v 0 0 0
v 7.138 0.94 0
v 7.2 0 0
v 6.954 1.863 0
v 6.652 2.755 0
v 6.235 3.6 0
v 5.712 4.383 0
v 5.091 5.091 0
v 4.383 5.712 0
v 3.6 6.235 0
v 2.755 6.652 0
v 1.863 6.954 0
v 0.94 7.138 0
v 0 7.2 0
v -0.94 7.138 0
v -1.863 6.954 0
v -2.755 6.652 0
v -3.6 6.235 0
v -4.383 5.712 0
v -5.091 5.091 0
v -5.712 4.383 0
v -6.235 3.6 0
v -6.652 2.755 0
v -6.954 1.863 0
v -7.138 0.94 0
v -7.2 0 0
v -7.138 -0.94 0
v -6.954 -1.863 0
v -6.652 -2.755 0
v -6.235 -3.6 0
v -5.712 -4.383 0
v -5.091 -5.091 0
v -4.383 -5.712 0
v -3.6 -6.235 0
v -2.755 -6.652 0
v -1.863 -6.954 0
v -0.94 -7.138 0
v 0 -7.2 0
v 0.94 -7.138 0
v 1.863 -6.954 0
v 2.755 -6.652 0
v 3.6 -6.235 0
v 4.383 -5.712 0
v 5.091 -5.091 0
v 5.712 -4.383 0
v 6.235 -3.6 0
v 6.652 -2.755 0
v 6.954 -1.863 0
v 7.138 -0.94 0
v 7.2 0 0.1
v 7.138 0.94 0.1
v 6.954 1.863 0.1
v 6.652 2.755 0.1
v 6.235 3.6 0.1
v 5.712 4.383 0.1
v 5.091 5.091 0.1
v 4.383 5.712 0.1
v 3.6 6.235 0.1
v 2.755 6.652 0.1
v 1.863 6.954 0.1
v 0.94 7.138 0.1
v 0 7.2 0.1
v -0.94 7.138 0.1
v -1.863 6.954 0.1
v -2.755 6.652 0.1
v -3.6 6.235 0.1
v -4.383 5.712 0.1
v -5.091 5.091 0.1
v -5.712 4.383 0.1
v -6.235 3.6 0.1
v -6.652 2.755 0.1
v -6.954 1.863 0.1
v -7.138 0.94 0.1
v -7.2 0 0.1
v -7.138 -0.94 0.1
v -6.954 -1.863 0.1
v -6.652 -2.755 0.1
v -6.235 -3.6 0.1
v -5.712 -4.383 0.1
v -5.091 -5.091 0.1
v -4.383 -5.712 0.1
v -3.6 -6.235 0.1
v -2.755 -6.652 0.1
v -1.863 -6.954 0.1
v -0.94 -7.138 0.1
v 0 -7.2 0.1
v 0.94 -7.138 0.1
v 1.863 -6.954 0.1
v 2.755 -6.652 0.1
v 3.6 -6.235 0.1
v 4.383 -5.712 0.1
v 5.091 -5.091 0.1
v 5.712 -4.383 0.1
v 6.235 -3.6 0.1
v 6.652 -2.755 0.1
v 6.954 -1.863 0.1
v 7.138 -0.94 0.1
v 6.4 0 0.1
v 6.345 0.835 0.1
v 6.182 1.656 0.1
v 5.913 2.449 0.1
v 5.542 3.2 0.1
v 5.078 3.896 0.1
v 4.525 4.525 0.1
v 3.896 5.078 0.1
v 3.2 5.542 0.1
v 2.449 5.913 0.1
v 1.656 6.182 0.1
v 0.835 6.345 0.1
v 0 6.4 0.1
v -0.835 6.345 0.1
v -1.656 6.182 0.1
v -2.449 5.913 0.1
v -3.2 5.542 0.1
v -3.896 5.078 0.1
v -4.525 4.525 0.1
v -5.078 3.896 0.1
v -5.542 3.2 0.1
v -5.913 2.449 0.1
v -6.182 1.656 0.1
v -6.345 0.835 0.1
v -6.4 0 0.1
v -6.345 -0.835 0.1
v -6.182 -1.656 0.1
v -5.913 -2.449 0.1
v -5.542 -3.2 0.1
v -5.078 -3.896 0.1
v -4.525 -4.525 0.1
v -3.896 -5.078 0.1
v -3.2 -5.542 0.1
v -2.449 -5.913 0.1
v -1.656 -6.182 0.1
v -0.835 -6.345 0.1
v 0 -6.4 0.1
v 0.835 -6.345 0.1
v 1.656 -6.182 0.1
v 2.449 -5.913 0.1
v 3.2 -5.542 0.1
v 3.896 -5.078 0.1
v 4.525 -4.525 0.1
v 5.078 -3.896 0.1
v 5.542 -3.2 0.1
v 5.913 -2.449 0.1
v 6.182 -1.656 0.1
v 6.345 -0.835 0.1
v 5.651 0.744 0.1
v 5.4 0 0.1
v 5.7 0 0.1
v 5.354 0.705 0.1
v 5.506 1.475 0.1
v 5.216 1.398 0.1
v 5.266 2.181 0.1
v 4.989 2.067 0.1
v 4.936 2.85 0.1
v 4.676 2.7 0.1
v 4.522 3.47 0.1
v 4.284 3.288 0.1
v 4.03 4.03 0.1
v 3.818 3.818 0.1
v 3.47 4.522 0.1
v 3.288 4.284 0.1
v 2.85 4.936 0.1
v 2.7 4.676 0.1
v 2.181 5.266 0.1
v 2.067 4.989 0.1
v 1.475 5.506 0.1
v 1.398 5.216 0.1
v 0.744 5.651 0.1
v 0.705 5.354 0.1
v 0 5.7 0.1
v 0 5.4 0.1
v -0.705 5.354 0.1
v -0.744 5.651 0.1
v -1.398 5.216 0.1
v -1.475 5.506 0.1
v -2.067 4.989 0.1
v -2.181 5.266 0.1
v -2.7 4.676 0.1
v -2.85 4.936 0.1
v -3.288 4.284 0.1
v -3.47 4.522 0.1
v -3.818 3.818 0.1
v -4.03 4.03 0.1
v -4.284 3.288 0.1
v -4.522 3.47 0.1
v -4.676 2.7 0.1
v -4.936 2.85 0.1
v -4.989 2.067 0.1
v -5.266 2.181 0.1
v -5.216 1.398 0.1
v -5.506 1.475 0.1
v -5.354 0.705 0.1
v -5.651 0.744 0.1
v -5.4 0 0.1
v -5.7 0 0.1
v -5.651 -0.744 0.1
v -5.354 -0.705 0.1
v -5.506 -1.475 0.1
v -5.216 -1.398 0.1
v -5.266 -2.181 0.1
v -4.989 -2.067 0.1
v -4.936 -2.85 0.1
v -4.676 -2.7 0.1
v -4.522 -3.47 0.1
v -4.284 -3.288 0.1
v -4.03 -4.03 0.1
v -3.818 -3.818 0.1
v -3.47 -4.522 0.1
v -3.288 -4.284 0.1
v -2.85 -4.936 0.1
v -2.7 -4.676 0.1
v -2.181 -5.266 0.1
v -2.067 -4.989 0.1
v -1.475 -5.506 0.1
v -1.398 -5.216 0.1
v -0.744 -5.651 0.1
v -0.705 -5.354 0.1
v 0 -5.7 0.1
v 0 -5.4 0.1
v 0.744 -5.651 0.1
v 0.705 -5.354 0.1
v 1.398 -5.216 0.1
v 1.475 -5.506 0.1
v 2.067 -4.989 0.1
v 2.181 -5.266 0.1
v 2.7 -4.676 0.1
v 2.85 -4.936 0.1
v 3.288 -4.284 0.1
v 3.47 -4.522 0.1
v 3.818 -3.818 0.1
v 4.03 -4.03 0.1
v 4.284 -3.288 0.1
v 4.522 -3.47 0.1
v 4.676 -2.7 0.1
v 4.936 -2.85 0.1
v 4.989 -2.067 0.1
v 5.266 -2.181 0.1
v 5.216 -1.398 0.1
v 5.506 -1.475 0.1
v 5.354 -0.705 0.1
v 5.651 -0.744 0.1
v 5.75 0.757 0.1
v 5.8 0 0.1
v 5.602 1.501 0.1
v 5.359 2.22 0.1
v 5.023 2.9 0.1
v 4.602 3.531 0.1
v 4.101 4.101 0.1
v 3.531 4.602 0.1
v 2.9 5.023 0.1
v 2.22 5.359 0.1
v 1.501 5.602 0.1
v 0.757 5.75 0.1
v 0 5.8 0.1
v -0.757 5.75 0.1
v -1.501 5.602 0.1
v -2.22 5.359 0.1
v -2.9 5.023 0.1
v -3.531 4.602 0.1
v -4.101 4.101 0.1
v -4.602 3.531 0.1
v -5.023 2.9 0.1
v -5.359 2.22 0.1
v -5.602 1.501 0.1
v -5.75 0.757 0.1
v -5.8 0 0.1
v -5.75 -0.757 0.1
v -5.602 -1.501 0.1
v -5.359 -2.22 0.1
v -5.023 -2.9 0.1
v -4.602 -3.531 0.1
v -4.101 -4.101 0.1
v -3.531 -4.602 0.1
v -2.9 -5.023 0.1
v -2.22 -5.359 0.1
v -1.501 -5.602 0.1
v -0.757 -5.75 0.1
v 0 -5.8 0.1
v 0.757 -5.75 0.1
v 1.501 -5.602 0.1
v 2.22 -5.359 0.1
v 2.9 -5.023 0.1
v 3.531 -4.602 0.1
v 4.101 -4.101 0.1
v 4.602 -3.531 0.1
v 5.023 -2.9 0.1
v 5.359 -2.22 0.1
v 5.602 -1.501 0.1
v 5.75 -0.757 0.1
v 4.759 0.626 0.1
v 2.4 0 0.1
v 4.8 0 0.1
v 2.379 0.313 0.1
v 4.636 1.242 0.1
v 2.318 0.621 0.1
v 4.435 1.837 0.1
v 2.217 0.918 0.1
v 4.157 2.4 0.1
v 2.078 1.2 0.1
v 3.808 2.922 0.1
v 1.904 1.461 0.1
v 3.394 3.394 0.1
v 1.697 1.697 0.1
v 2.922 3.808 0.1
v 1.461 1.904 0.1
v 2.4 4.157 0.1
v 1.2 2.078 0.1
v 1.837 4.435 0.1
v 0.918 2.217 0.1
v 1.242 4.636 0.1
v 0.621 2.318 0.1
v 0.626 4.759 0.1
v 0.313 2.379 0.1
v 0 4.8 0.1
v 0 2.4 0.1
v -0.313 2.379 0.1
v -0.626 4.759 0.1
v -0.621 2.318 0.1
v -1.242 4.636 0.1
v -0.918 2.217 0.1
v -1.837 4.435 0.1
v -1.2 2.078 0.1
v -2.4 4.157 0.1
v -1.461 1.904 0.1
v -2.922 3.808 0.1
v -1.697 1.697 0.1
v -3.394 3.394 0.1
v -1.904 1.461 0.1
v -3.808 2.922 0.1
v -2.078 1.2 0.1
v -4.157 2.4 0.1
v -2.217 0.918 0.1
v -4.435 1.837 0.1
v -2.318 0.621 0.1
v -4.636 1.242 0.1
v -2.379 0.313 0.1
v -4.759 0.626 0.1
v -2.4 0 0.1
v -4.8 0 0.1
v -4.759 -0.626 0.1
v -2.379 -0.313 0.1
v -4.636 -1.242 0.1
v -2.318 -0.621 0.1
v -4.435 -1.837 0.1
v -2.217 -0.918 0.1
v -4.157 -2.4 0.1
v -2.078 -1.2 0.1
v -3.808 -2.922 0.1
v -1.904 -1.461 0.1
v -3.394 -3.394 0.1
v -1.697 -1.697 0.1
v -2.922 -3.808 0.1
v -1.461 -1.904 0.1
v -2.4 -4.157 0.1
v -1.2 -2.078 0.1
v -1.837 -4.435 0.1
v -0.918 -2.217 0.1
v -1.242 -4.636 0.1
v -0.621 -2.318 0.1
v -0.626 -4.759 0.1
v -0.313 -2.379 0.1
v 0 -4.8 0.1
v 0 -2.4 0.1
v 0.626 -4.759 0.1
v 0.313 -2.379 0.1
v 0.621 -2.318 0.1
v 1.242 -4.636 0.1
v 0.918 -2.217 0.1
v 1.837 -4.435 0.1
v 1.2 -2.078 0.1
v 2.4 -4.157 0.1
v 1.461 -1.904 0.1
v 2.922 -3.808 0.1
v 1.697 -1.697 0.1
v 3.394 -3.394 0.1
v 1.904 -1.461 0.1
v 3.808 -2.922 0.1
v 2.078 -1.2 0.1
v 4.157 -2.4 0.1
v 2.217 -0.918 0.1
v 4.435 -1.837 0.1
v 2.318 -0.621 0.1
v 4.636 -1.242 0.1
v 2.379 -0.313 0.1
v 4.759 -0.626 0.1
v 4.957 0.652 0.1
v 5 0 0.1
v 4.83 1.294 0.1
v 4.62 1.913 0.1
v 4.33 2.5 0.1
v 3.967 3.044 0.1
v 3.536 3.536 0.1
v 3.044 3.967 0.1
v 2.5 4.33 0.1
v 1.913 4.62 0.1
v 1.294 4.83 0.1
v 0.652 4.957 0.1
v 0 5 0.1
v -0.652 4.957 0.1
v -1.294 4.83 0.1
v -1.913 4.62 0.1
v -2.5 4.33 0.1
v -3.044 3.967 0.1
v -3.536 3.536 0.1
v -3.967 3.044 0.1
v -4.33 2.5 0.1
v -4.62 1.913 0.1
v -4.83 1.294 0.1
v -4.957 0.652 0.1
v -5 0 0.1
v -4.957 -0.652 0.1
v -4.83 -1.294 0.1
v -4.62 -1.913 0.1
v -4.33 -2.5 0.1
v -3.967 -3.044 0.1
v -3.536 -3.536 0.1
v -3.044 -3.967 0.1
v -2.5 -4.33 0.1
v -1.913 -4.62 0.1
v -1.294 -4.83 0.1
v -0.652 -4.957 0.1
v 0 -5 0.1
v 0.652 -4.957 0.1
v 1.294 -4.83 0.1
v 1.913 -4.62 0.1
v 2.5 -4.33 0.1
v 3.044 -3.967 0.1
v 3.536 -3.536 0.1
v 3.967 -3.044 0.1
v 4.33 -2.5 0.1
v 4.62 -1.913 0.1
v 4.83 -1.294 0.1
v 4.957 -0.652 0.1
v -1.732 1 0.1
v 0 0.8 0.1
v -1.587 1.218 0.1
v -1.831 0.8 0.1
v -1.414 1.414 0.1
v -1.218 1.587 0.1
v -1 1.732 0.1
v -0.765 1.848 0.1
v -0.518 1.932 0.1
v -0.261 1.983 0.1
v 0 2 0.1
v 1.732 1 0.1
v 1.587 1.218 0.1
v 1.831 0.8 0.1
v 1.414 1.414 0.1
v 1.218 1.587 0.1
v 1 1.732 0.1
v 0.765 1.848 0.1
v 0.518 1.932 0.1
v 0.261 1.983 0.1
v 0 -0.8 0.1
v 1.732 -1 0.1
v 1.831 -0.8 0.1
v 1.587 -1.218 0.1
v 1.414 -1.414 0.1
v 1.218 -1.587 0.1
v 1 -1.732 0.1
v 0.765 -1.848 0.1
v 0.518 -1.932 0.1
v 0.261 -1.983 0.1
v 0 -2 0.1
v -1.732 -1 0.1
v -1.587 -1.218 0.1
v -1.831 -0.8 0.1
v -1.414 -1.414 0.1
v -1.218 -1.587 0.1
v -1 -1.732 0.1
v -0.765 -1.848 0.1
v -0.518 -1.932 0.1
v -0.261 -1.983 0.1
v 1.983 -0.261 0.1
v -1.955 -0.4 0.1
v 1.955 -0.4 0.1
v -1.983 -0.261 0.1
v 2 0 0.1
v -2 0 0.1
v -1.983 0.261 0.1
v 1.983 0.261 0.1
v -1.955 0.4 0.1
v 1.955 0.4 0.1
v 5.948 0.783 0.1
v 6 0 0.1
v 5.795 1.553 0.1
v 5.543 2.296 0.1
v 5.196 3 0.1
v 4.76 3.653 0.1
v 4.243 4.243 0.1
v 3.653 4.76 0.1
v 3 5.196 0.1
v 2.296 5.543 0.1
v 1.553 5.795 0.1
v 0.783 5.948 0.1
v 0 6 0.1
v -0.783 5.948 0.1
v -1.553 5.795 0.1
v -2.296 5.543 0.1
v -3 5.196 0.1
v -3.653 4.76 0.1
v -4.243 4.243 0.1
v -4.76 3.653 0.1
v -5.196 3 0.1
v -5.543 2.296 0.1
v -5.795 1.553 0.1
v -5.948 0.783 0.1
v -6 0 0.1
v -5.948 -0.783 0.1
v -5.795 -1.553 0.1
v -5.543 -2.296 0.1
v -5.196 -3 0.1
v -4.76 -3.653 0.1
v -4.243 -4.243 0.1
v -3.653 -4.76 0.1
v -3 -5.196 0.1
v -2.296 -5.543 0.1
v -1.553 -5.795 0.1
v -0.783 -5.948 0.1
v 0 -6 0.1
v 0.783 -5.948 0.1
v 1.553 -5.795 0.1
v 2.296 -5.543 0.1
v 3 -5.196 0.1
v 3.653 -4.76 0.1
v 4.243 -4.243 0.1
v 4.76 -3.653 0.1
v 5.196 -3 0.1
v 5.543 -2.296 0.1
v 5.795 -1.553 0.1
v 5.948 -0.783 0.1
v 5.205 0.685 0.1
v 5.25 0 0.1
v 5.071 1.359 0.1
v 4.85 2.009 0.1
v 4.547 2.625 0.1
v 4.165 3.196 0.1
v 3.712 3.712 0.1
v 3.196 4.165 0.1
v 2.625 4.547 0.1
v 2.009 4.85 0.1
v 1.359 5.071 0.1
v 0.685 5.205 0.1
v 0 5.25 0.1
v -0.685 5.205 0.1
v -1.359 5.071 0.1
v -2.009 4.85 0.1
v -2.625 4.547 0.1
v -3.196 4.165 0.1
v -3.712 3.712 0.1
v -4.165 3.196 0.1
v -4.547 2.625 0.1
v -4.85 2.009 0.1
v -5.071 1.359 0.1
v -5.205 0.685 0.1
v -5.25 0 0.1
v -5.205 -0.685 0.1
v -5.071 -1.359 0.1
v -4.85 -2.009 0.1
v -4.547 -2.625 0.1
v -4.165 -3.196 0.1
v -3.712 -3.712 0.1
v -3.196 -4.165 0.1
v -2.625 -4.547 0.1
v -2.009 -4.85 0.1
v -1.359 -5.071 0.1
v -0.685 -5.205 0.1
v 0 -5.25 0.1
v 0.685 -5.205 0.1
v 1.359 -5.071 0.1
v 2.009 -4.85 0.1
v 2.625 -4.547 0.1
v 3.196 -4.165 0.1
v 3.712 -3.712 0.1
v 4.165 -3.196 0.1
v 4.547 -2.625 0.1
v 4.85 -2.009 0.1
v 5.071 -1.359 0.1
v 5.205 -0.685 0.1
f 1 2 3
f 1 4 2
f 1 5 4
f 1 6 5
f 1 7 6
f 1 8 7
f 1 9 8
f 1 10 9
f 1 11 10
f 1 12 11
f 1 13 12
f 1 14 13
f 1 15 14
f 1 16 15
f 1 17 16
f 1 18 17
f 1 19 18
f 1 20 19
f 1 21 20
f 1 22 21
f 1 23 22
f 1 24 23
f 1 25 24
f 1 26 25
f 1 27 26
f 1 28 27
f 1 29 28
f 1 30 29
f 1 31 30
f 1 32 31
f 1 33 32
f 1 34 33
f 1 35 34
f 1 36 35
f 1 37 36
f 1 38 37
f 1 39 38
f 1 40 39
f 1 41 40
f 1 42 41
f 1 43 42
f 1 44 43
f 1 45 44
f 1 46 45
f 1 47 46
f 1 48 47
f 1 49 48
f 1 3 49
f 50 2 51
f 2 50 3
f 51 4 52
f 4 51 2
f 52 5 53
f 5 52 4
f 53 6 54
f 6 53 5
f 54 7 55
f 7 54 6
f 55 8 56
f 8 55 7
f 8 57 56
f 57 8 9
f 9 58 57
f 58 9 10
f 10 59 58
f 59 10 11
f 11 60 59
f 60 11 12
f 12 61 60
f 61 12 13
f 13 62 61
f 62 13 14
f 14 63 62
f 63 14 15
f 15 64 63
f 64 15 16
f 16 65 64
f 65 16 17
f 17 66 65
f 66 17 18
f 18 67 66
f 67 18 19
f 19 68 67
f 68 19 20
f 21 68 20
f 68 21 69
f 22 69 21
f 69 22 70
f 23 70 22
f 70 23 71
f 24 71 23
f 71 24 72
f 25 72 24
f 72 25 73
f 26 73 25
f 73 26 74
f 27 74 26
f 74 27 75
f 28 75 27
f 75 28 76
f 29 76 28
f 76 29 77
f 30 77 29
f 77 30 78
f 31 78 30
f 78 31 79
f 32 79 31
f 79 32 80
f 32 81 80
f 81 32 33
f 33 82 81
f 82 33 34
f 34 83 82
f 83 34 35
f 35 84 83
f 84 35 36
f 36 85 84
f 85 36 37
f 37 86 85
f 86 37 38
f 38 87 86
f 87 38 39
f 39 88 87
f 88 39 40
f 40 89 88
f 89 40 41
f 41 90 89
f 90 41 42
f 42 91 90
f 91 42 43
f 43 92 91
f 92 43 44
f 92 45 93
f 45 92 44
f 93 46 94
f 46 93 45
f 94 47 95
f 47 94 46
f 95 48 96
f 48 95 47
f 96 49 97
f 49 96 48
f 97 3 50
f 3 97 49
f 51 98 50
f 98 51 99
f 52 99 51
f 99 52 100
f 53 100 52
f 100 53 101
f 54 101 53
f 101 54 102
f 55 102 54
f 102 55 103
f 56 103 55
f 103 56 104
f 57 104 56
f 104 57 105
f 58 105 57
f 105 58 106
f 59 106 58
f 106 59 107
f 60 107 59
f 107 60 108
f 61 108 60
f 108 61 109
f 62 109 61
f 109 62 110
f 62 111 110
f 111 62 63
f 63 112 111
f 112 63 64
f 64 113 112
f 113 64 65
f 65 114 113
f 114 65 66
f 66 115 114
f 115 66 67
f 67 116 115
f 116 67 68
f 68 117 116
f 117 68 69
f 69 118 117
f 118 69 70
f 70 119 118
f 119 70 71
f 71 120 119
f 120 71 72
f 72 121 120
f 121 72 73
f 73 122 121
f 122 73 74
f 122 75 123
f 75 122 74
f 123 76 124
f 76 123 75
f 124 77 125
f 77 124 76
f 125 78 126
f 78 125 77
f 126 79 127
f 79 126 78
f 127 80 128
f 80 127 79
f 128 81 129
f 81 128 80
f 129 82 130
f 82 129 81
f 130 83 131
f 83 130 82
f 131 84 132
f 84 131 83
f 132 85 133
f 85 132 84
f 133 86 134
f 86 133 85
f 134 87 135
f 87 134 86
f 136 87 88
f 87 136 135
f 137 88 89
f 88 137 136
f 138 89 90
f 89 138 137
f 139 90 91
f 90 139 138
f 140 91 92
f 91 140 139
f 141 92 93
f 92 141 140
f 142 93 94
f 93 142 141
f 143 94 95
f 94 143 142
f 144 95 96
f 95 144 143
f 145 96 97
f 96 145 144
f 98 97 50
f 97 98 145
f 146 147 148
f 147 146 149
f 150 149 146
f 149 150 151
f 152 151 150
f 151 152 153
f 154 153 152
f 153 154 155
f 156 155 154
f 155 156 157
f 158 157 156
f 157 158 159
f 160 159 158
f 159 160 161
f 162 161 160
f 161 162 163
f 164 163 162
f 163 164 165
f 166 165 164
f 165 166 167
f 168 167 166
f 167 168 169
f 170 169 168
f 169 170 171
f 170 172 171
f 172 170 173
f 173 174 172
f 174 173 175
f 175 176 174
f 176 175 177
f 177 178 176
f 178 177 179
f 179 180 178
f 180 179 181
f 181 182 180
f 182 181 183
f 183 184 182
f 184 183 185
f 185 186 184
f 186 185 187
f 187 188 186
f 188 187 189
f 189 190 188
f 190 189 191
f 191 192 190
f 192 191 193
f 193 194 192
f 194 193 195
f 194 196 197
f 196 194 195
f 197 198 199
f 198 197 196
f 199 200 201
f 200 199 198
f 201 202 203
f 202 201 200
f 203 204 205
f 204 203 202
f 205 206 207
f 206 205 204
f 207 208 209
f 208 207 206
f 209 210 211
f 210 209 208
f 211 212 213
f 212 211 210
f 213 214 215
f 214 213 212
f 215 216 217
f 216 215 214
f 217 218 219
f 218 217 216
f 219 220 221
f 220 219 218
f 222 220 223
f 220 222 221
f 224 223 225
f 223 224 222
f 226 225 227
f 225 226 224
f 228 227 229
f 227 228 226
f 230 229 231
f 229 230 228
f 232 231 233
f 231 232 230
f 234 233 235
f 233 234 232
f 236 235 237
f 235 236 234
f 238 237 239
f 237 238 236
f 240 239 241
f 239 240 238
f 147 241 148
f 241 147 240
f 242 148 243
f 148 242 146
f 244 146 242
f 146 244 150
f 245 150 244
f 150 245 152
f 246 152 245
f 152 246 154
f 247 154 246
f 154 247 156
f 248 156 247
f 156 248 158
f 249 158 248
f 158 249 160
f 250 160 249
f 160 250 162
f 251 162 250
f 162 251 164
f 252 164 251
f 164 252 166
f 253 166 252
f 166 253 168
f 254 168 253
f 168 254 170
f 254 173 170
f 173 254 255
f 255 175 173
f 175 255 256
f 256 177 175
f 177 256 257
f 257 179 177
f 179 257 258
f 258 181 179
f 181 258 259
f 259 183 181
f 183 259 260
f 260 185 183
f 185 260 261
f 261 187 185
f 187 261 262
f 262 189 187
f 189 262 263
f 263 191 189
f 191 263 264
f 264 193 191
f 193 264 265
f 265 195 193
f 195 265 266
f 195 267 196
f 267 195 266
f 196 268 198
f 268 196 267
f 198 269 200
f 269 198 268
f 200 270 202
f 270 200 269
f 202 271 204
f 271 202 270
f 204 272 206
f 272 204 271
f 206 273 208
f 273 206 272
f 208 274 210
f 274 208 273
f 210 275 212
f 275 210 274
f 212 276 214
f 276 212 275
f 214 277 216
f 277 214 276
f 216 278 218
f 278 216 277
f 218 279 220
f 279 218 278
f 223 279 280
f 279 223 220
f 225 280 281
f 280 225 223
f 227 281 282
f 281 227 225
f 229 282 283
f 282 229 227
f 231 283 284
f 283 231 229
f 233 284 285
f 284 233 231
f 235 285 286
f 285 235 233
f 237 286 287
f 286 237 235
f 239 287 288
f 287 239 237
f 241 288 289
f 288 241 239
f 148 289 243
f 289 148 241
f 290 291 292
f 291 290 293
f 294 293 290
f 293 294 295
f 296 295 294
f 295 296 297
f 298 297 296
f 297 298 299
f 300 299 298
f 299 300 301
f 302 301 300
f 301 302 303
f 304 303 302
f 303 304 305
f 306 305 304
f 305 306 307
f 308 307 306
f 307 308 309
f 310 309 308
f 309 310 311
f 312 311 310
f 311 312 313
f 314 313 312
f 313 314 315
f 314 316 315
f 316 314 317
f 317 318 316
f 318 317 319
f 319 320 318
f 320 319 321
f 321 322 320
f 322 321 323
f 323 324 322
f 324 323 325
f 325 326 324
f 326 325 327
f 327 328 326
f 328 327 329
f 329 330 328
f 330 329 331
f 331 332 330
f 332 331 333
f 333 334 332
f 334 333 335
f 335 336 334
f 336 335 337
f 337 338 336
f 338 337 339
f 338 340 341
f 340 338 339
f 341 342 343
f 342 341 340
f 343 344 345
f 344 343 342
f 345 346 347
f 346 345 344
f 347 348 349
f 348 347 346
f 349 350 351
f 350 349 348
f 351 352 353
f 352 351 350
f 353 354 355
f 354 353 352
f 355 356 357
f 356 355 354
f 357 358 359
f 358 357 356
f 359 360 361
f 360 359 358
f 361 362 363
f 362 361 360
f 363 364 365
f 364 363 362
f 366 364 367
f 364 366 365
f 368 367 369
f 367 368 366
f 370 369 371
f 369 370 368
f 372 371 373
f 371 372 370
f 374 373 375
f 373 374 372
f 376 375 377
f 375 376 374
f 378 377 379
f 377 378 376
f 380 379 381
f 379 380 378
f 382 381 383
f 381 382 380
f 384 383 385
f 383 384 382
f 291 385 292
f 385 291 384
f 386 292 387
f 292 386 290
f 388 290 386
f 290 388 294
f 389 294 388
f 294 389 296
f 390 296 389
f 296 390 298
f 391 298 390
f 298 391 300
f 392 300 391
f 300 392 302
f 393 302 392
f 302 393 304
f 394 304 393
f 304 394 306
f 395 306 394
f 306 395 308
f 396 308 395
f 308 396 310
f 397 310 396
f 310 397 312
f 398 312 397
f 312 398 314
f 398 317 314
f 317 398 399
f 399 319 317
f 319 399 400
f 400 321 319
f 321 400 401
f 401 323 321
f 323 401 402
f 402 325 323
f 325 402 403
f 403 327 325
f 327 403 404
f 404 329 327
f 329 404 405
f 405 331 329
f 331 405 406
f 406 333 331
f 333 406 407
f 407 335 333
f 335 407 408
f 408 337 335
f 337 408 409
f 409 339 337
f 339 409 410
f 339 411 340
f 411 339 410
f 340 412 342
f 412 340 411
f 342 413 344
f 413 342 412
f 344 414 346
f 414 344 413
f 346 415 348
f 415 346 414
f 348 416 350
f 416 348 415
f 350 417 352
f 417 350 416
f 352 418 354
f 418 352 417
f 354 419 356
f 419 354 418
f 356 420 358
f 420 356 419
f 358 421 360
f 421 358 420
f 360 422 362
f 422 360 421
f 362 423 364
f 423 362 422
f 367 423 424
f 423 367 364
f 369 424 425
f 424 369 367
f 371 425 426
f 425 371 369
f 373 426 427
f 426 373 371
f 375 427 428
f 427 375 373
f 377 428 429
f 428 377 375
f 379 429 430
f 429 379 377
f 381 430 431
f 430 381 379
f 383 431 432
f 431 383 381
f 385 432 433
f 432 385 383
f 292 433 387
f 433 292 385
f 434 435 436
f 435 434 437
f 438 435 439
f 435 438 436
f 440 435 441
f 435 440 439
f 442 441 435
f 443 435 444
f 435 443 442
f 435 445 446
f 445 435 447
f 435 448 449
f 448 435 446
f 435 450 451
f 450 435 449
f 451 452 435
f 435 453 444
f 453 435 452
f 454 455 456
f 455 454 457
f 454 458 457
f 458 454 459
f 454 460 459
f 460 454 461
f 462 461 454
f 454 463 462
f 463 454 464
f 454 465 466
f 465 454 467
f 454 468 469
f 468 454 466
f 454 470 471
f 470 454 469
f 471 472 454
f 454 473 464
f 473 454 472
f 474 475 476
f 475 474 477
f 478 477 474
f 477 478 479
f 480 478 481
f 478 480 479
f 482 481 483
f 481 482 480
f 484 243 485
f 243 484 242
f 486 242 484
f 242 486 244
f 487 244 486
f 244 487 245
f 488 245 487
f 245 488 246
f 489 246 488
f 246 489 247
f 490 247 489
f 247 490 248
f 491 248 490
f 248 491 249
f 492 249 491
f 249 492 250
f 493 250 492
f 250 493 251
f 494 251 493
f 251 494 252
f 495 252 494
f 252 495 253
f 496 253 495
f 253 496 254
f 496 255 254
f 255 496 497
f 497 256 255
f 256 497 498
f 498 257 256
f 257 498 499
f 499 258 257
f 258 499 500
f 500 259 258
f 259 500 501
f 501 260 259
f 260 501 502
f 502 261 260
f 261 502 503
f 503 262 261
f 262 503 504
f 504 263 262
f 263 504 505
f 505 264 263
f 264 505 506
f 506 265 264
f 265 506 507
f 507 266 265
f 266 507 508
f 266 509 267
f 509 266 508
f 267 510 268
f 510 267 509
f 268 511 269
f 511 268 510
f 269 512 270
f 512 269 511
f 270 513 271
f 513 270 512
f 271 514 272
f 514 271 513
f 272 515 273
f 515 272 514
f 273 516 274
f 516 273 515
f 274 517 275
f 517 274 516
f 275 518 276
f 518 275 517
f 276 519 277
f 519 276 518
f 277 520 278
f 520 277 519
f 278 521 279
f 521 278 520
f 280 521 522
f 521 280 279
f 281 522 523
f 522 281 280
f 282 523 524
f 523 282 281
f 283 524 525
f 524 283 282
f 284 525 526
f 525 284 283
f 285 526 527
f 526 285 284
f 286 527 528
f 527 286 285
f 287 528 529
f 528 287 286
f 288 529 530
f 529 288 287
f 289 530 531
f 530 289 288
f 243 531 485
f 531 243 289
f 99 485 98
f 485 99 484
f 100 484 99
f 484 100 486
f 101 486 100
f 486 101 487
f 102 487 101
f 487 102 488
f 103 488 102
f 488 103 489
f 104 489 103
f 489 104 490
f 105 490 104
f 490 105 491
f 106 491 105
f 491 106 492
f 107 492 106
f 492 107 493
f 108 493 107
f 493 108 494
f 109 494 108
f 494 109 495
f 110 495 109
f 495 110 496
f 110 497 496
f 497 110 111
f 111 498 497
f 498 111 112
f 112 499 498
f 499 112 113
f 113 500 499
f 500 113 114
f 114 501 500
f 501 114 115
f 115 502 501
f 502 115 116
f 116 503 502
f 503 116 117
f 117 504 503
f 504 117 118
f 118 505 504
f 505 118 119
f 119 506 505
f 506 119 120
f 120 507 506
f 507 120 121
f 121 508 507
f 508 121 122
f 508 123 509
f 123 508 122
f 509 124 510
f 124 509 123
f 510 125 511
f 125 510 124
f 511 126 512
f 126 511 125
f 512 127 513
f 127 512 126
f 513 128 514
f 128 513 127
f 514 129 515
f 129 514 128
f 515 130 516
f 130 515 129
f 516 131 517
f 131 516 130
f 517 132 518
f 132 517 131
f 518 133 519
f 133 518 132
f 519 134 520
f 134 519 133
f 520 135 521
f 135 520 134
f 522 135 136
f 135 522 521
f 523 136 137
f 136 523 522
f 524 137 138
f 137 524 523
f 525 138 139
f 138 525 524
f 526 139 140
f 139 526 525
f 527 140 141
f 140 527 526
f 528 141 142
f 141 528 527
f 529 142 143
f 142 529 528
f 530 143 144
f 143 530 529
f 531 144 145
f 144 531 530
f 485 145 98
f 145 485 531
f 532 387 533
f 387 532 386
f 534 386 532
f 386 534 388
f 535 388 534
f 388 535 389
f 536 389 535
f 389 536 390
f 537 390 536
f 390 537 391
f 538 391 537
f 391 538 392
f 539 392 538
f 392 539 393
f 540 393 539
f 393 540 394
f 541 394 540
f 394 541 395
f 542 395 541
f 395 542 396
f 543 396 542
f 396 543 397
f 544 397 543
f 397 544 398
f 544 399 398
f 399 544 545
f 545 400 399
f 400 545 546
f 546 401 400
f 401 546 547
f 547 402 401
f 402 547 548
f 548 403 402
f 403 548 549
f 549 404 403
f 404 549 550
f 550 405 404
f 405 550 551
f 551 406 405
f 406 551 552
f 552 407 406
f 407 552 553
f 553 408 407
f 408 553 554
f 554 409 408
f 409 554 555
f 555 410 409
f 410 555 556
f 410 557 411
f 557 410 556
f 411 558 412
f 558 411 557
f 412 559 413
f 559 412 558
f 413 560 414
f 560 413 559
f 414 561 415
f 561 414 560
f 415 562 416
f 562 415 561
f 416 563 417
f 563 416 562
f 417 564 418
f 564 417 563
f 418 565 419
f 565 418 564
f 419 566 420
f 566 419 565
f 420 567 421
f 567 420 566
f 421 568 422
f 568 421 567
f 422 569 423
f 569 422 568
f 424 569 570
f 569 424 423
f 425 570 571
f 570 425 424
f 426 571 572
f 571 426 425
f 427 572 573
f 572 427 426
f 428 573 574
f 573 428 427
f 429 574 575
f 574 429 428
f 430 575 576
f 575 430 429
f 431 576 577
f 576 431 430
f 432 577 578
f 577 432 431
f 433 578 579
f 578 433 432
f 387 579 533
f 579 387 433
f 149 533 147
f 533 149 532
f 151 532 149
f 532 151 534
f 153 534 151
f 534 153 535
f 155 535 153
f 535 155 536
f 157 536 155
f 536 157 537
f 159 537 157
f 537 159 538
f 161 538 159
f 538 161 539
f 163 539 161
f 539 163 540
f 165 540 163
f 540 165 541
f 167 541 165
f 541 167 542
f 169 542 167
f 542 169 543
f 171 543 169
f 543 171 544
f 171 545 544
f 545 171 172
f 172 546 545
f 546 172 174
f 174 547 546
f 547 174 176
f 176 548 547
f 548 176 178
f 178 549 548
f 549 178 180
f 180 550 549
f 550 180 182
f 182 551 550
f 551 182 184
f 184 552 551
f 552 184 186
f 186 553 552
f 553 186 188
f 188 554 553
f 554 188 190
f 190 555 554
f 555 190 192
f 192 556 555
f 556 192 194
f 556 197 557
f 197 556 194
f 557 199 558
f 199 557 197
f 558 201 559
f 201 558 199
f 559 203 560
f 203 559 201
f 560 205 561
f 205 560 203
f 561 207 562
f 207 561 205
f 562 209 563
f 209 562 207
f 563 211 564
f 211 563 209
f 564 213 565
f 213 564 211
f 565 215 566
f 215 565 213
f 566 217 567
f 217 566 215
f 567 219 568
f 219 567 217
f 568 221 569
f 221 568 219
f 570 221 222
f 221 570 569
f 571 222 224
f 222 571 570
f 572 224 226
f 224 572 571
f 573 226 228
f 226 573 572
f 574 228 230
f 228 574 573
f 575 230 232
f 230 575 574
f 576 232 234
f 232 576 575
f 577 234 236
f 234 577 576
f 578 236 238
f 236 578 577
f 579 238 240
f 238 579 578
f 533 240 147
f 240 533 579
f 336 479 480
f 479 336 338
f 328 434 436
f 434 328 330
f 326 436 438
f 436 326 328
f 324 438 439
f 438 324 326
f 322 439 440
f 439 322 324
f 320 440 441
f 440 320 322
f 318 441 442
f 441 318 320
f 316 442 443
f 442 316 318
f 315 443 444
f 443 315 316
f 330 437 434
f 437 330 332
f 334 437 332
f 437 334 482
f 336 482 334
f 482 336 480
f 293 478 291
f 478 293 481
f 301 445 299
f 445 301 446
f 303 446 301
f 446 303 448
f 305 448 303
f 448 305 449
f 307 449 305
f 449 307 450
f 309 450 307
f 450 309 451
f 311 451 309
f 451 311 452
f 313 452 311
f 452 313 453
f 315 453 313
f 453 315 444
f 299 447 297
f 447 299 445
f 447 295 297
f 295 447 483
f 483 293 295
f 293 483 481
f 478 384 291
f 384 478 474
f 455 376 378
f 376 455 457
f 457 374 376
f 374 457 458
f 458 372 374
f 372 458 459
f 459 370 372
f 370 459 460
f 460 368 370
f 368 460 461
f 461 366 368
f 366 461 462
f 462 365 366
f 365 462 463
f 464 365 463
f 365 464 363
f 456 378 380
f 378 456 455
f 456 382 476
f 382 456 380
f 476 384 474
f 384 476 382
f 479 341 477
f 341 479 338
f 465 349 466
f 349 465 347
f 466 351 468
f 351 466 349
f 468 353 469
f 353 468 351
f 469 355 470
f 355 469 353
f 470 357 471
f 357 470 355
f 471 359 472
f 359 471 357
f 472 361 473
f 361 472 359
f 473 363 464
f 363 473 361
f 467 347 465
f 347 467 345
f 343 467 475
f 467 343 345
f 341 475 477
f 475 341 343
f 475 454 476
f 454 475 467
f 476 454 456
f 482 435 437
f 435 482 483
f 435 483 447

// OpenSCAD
use <../lib.scad>
use <../p/48/4-4cylc3.scad>
use <../p/48/4-4ring1.scad>
use <../p/48/4-4ring15.scad>
use <../p/48/4-4ring18.scad>
use <../p/48/4-4ring20.scad>
use <../p/48/4-4ring24.scad>
use <../p/48/4-4ring29.scad>
use <../p/48/4-4ring35.scad>
use <../p/48/4-4ring57.scad>
use <../p/48/4-4ring8.scad>
function ldraw_lib__6347356k() = [
// 0 Sticker  1.8 x  1.8 Round with Black Rings
// 0 Name: 6347356k.dat
// 0 Author: Evert-Jan Boer [ejboer]
// 0 !LDRAW_ORG Part UPDATE 2025-04
// 0 !LICENSE Licensed under CC BY 4.0 : see CAreadme.txt
// 
// 0 BFC CERTIFY CCW
  [0,"BFC","CERTIFY"],
  [0,"BFC","CCW"],
// 
// 0 !KEYWORDS Republic Gunship, Set 75309, Star Wars
// 
// 0 !HISTORY 2024-03-23 [OrionP] Updated ring primitives
// 0 !HISTORY 2025-04-27 [OrionP] Official Update 2025-04
// 
// 1 16 0 0 0 18 0 0 0 -0.25 0 0 0 18 48\4-4cylc3.dat
  [1,16,0,0,0,18,0,0,0,-0.25,0,0,0,18, ldraw_lib__48__4_4cylc3()],
// 1 16 0 -.25 0 2 0 0 0 1 0 0 0 2 48\4-4ring8.dat
  [1,16,0,-.25,0,2,0,0,0,1,0,0,0,2, ldraw_lib__48__4_4ring8()],
// 1 16 0 -.25 0 .75 0 0 0 1 0 0 0 .75 48\4-4ring18.dat
  [1,16,0,-.25,0,.75,0,0,0,1,0,0,0,.75, ldraw_lib__48__4_4ring18()],
// 1 16 0 -.25 0 .25 0 0 0 1 0 0 0 .25 48\4-4ring57.dat
  [1,16,0,-.25,0,.25,0,0,0,1,0,0,0,.25, ldraw_lib__48__4_4ring57()],
// 1 16 0 -.25 0 6 0 0 0 1 0 0 0 6 48\4-4ring1.dat
  [1,16,0,-.25,0,6,0,0,0,1,0,0,0,6, ldraw_lib__48__4_4ring1()],
// 1 16 0 -.25 0 .5 0 0 0 1 0 0 0 .5 48\4-4ring24.dat
  [1,16,0,-.25,0,.5,0,0,0,1,0,0,0,.5, ldraw_lib__48__4_4ring24()],
// 4 16 -4.5768 -.25 2 0 -.25 2 -3.967 -.25 3.044 -4.33 -.25 2.5
  [4,16,-4.5768,-.25,2,0,-.25,2,-3.967,-.25,3.044,-4.33,-.25,2.5],
// 4 16 -3.967 -.25 3.044 0 -.25 2 -3.044 -.25 3.967 -3.5355 -.25 3.5355
  [4,16,-3.967,-.25,3.044,0,-.25,2,-3.044,-.25,3.967,-3.5355,-.25,3.5355],
// 4 16 -3.044 -.25 3.967 0 -.25 2 -1.9135 -.25 4.6195 -2.5 -.25 4.33
  [4,16,-3.044,-.25,3.967,0,-.25,2,-1.9135,-.25,4.6195,-2.5,-.25,4.33],
// 3 16 -1.294 -.25 4.8295 -1.9135 -.25 4.6195 0 -.25 2
  [3,16,-1.294,-.25,4.8295,-1.9135,-.25,4.6195,0,-.25,2],
// 4 16 0 -.25 5 -.6525 -.25 4.957 -1.294 -.25 4.8295 0 -.25 2
  [4,16,0,-.25,5,-.6525,-.25,4.957,-1.294,-.25,4.8295,0,-.25,2],
// 4 16 3.967 -.25 3.044 0 -.25 2 4.5768 -.25 2 4.33 -.25 2.5
  [4,16,3.967,-.25,3.044,0,-.25,2,4.5768,-.25,2,4.33,-.25,2.5],
// 4 16 3.044 -.25 3.967 0 -.25 2 3.967 -.25 3.044 3.5355 -.25 3.5355
  [4,16,3.044,-.25,3.967,0,-.25,2,3.967,-.25,3.044,3.5355,-.25,3.5355],
// 4 16 1.9135 -.25 4.6195 0 -.25 2 3.044 -.25 3.967 2.5 -.25 4.33
  [4,16,1.9135,-.25,4.6195,0,-.25,2,3.044,-.25,3.967,2.5,-.25,4.33],
// 3 16 1.9135 -.25 4.6195 1.294 -.25 4.8295 0 -.25 2
  [3,16,1.9135,-.25,4.6195,1.294,-.25,4.8295,0,-.25,2],
// 4 16 1.294 -.25 4.8295 .6525 -.25 4.957 0 -.25 5 0 -.25 2
  [4,16,1.294,-.25,4.8295,.6525,-.25,4.957,0,-.25,5,0,-.25,2],
// 4 16 4.5768 -.25 -2 0 -.25 -2 3.967 -.25 -3.044 4.33 -.25 -2.5
  [4,16,4.5768,-.25,-2,0,-.25,-2,3.967,-.25,-3.044,4.33,-.25,-2.5],
// 4 16 3.967 -.25 -3.044 0 -.25 -2 3.044 -.25 -3.967 3.5355 -.25 -3.5355
  [4,16,3.967,-.25,-3.044,0,-.25,-2,3.044,-.25,-3.967,3.5355,-.25,-3.5355],
// 4 16 3.044 -.25 -3.967 0 -.25 -2 1.9135 -.25 -4.6195 2.5 -.25 -4.33
  [4,16,3.044,-.25,-3.967,0,-.25,-2,1.9135,-.25,-4.6195,2.5,-.25,-4.33],
// 3 16 1.294 -.25 -4.8295 1.9135 -.25 -4.6195 0 -.25 -2
  [3,16,1.294,-.25,-4.8295,1.9135,-.25,-4.6195,0,-.25,-2],
// 4 16 0 -.25 -5 .6525 -.25 -4.957 1.294 -.25 -4.8295 0 -.25 -2
  [4,16,0,-.25,-5,.6525,-.25,-4.957,1.294,-.25,-4.8295,0,-.25,-2],
// 4 16 -3.967 -.25 -3.044 0 -.25 -2 -4.5768 -.25 -2 -4.33 -.25 -2.5
  [4,16,-3.967,-.25,-3.044,0,-.25,-2,-4.5768,-.25,-2,-4.33,-.25,-2.5],
// 4 16 -3.044 -.25 -3.967 0 -.25 -2 -3.967 -.25 -3.044 -3.5355 -.25 -3.5355
  [4,16,-3.044,-.25,-3.967,0,-.25,-2,-3.967,-.25,-3.044,-3.5355,-.25,-3.5355],
// 4 16 -1.9135 -.25 -4.6195 0 -.25 -2 -3.044 -.25 -3.967 -2.5 -.25 -4.33
  [4,16,-1.9135,-.25,-4.6195,0,-.25,-2,-3.044,-.25,-3.967,-2.5,-.25,-4.33],
// 3 16 -1.9135 -.25 -4.6195 -1.294 -.25 -4.8295 0 -.25 -2
  [3,16,-1.9135,-.25,-4.6195,-1.294,-.25,-4.8295,0,-.25,-2],
// 4 16 -1.294 -.25 -4.8295 -.6525 -.25 -4.957 0 -.25 -5 0 -.25 -2
  [4,16,-1.294,-.25,-4.8295,-.6525,-.25,-4.957,0,-.25,-5,0,-.25,-2],
// 4 16 -4.957 -.25 -.6525 -4.8879 -.25 -1 4.8879 -.25 -1 4.957 -.25 -.6525
  [4,16,-4.957,-.25,-.6525,-4.8879,-.25,-1,4.8879,-.25,-1,4.957,-.25,-.6525],
// 4 16 -5 -.25 0 -4.957 -.25 -.6525 4.957 -.25 -.6525 5 -.25 0
  [4,16,-5,-.25,0,-4.957,-.25,-.6525,4.957,-.25,-.6525,5,-.25,0],
// 4 16 4.957 -.25 .6525 -4.957 -.25 .6525 -5 -.25 0 5 -.25 0
  [4,16,4.957,-.25,.6525,-4.957,-.25,.6525,-5,-.25,0,5,-.25,0],
// 4 16 4.8879 -.25 1 -4.8879 -.25 1 -4.957 -.25 .6525 4.957 -.25 .6525
  [4,16,4.8879,-.25,1,-4.8879,-.25,1,-4.957,-.25,.6525,4.957,-.25,.6525],
// 
// 0 BFC NOCLIP
  [0,"BFC","NOCLIP"],
// 1 0 0 -.25 0 .5 0 0 0 1 0 0 0 .5 48\4-4ring29.dat
  [1,0,0,-.25,0,.5,0,0,0,1,0,0,0,.5, ldraw_lib__48__4_4ring29()],
// 1 0 0 -.25 0 1 0 0 0 1 0 0 0 1 48\4-4ring15.dat
  [1,0,0,-.25,0,1,0,0,0,1,0,0,0,1, ldraw_lib__48__4_4ring15()],
// 1 0 0 -.25 0 .625 0 0 0 1 0 0 0 .625 48\4-4ring20.dat
  [1,0,0,-.25,0,.625,0,0,0,1,0,0,0,.625, ldraw_lib__48__4_4ring20()],
// 1 0 0 -.25 0 .375 0 0 0 1 0 0 0 .375 48\4-4ring35.dat
  [1,0,0,-.25,0,.375,0,0,0,1,0,0,0,.375, ldraw_lib__48__4_4ring35()],
// 4 0 -4.957 -.25 .6525 -5.9484 -.25 .783 -6 -.25 0 -5 -.25 0
  [4,0,-4.957,-.25,.6525,-5.9484,-.25,.783,-6,-.25,0,-5,-.25,0],
// 4 0 -5.196 -.25 3 -4.33 -.25 2.5 -3.967 -.25 3.044 -4.7604 -.25 3.6528
  [4,0,-5.196,-.25,3,-4.33,-.25,2.5,-3.967,-.25,3.044,-4.7604,-.25,3.6528],
// 4 0 -3.5355 -.25 3.5355 -4.2426 -.25 4.2426 -4.7604 -.25 3.6528 -3.967 -.25 3.044
  [4,0,-3.5355,-.25,3.5355,-4.2426,-.25,4.2426,-4.7604,-.25,3.6528,-3.967,-.25,3.044],
// 4 0 -4.2426 -.25 4.2426 -3.5355 -.25 3.5355 -3.044 -.25 3.967 -3.6528 -.25 4.7604
  [4,0,-4.2426,-.25,4.2426,-3.5355,-.25,3.5355,-3.044,-.25,3.967,-3.6528,-.25,4.7604],
// 4 0 -2.5 -.25 4.33 -3 -.25 5.196 -3.6528 -.25 4.7604 -3.044 -.25 3.967
  [4,0,-2.5,-.25,4.33,-3,-.25,5.196,-3.6528,-.25,4.7604,-3.044,-.25,3.967],
// 4 0 -3 -.25 5.196 -2.5 -.25 4.33 -1.9135 -.25 4.6195 -2.2962 -.25 5.5434
  [4,0,-3,-.25,5.196,-2.5,-.25,4.33,-1.9135,-.25,4.6195,-2.2962,-.25,5.5434],
// 4 0 -1.294 -.25 4.8295 -1.5528 -.25 5.7954 -2.2962 -.25 5.5434 -1.9135 -.25 4.6195
  [4,0,-1.294,-.25,4.8295,-1.5528,-.25,5.7954,-2.2962,-.25,5.5434,-1.9135,-.25,4.6195],
// 4 0 -1.5528 -.25 5.7954 -1.294 -.25 4.8295 -.6525 -.25 4.957 -.783 -.25 5.9484
  [4,0,-1.5528,-.25,5.7954,-1.294,-.25,4.8295,-.6525,-.25,4.957,-.783,-.25,5.9484],
// 4 0 0 -.25 5 0 -.25 6 -.783 -.25 5.9484 -.6525 -.25 4.957
  [4,0,0,-.25,5,0,-.25,6,-.783,-.25,5.9484,-.6525,-.25,4.957],
// 4 0 -4.5768 -.25 2 -4.33 -.25 2.5 -5.196 -.25 3 -5.5434 -.25 2.2962
  [4,0,-4.5768,-.25,2,-4.33,-.25,2.5,-5.196,-.25,3,-5.5434,-.25,2.2962],
// 4 0 -4.8879 -.25 1 -4.5768 -.25 2 -5.5434 -.25 2.2962 -5.7954 -.25 1.5528
  [4,0,-4.8879,-.25,1,-4.5768,-.25,2,-5.5434,-.25,2.2962,-5.7954,-.25,1.5528],
// 4 0 -5.9484 -.25 .783 -4.957 -.25 .6525 -4.8879 -.25 1 -5.7954 -.25 1.5528
  [4,0,-5.9484,-.25,.783,-4.957,-.25,.6525,-4.8879,-.25,1,-5.7954,-.25,1.5528],
// 4 0 6 -.25 0 5.9484 -.25 .783 4.957 -.25 .6525 5 -.25 0
  [4,0,6,-.25,0,5.9484,-.25,.783,4.957,-.25,.6525,5,-.25,0],
// 4 0 3.967 -.25 3.044 4.33 -.25 2.5 5.196 -.25 3 4.7604 -.25 3.6528
  [4,0,3.967,-.25,3.044,4.33,-.25,2.5,5.196,-.25,3,4.7604,-.25,3.6528],
// 4 0 4.7604 -.25 3.6528 4.2426 -.25 4.2426 3.5355 -.25 3.5355 3.967 -.25 3.044
  [4,0,4.7604,-.25,3.6528,4.2426,-.25,4.2426,3.5355,-.25,3.5355,3.967,-.25,3.044],
// 4 0 3.044 -.25 3.967 3.5355 -.25 3.5355 4.2426 -.25 4.2426 3.6528 -.25 4.7604
  [4,0,3.044,-.25,3.967,3.5355,-.25,3.5355,4.2426,-.25,4.2426,3.6528,-.25,4.7604],
// 4 0 3.6528 -.25 4.7604 3 -.25 5.196 2.5 -.25 4.33 3.044 -.25 3.967
  [4,0,3.6528,-.25,4.7604,3,-.25,5.196,2.5,-.25,4.33,3.044,-.25,3.967],
// 4 0 1.9135 -.25 4.6195 2.5 -.25 4.33 3 -.25 5.196 2.2962 -.25 5.5434
  [4,0,1.9135,-.25,4.6195,2.5,-.25,4.33,3,-.25,5.196,2.2962,-.25,5.5434],
// 4 0 2.2962 -.25 5.5434 1.5528 -.25 5.7954 1.294 -.25 4.8295 1.9135 -.25 4.6195
  [4,0,2.2962,-.25,5.5434,1.5528,-.25,5.7954,1.294,-.25,4.8295,1.9135,-.25,4.6195],
// 4 0 .6525 -.25 4.957 1.294 -.25 4.8295 1.5528 -.25 5.7954 .783 -.25 5.9484
  [4,0,.6525,-.25,4.957,1.294,-.25,4.8295,1.5528,-.25,5.7954,.783,-.25,5.9484],
// 4 0 .783 -.25 5.9484 0 -.25 6 0 -.25 5 .6525 -.25 4.957
  [4,0,.783,-.25,5.9484,0,-.25,6,0,-.25,5,.6525,-.25,4.957],
// 4 0 5.196 -.25 3 4.33 -.25 2.5 4.5768 -.25 2 5.5434 -.25 2.2962
  [4,0,5.196,-.25,3,4.33,-.25,2.5,4.5768,-.25,2,5.5434,-.25,2.2962],
// 4 0 5.5434 -.25 2.2962 4.5768 -.25 2 4.8879 -.25 1 5.7954 -.25 1.5528
  [4,0,5.5434,-.25,2.2962,4.5768,-.25,2,4.8879,-.25,1,5.7954,-.25,1.5528],
// 4 0 4.8879 -.25 1 4.957 -.25 .6525 5.9484 -.25 .783 5.7954 -.25 1.5528
  [4,0,4.8879,-.25,1,4.957,-.25,.6525,5.9484,-.25,.783,5.7954,-.25,1.5528],
// 4 0 4.957 -.25 -.6525 5.9484 -.25 -.783 6 -.25 0 5 -.25 0
  [4,0,4.957,-.25,-.6525,5.9484,-.25,-.783,6,-.25,0,5,-.25,0],
// 4 0 5.196 -.25 -3 4.33 -.25 -2.5 3.967 -.25 -3.044 4.7604 -.25 -3.6528
  [4,0,5.196,-.25,-3,4.33,-.25,-2.5,3.967,-.25,-3.044,4.7604,-.25,-3.6528],
// 4 0 3.5355 -.25 -3.5355 4.2426 -.25 -4.2426 4.7604 -.25 -3.6528 3.967 -.25 -3.044
  [4,0,3.5355,-.25,-3.5355,4.2426,-.25,-4.2426,4.7604,-.25,-3.6528,3.967,-.25,-3.044],
// 4 0 4.2426 -.25 -4.2426 3.5355 -.25 -3.5355 3.044 -.25 -3.967 3.6528 -.25 -4.7604
  [4,0,4.2426,-.25,-4.2426,3.5355,-.25,-3.5355,3.044,-.25,-3.967,3.6528,-.25,-4.7604],
// 4 0 2.5 -.25 -4.33 3 -.25 -5.196 3.6528 -.25 -4.7604 3.044 -.25 -3.967
  [4,0,2.5,-.25,-4.33,3,-.25,-5.196,3.6528,-.25,-4.7604,3.044,-.25,-3.967],
// 4 0 3 -.25 -5.196 2.5 -.25 -4.33 1.9135 -.25 -4.6195 2.2962 -.25 -5.5434
  [4,0,3,-.25,-5.196,2.5,-.25,-4.33,1.9135,-.25,-4.6195,2.2962,-.25,-5.5434],
// 4 0 1.294 -.25 -4.8295 1.5528 -.25 -5.7954 2.2962 -.25 -5.5434 1.9135 -.25 -4.6195
  [4,0,1.294,-.25,-4.8295,1.5528,-.25,-5.7954,2.2962,-.25,-5.5434,1.9135,-.25,-4.6195],
// 4 0 1.5528 -.25 -5.7954 1.294 -.25 -4.8295 .6525 -.25 -4.957 .783 -.25 -5.9484
  [4,0,1.5528,-.25,-5.7954,1.294,-.25,-4.8295,.6525,-.25,-4.957,.783,-.25,-5.9484],
// 4 0 0 -.25 -5 0 -.25 -6 .783 -.25 -5.9484 .6525 -.25 -4.957
  [4,0,0,-.25,-5,0,-.25,-6,.783,-.25,-5.9484,.6525,-.25,-4.957],
// 4 0 4.5768 -.25 -2 4.33 -.25 -2.5 5.196 -.25 -3 5.5434 -.25 -2.2962
  [4,0,4.5768,-.25,-2,4.33,-.25,-2.5,5.196,-.25,-3,5.5434,-.25,-2.2962],
// 4 0 4.8879 -.25 -1 4.5768 -.25 -2 5.5434 -.25 -2.2962 5.7954 -.25 -1.5528
  [4,0,4.8879,-.25,-1,4.5768,-.25,-2,5.5434,-.25,-2.2962,5.7954,-.25,-1.5528],
// 4 0 5.9484 -.25 -.783 4.957 -.25 -.6525 4.8879 -.25 -1 5.7954 -.25 -1.5528
  [4,0,5.9484,-.25,-.783,4.957,-.25,-.6525,4.8879,-.25,-1,5.7954,-.25,-1.5528],
// 4 0 -6 -.25 0 -5.9484 -.25 -.783 -4.957 -.25 -.6525 -5 -.25 0
  [4,0,-6,-.25,0,-5.9484,-.25,-.783,-4.957,-.25,-.6525,-5,-.25,0],
// 4 0 -3.967 -.25 -3.044 -4.33 -.25 -2.5 -5.196 -.25 -3 -4.7604 -.25 -3.6528
  [4,0,-3.967,-.25,-3.044,-4.33,-.25,-2.5,-5.196,-.25,-3,-4.7604,-.25,-3.6528],
// 4 0 -4.7604 -.25 -3.6528 -4.2426 -.25 -4.2426 -3.5355 -.25 -3.5355 -3.967 -.25 -3.044
  [4,0,-4.7604,-.25,-3.6528,-4.2426,-.25,-4.2426,-3.5355,-.25,-3.5355,-3.967,-.25,-3.044],
// 4 0 -3.044 -.25 -3.967 -3.5355 -.25 -3.5355 -4.2426 -.25 -4.2426 -3.6528 -.25 -4.7604
  [4,0,-3.044,-.25,-3.967,-3.5355,-.25,-3.5355,-4.2426,-.25,-4.2426,-3.6528,-.25,-4.7604],
// 4 0 -3.6528 -.25 -4.7604 -3 -.25 -5.196 -2.5 -.25 -4.33 -3.044 -.25 -3.967
  [4,0,-3.6528,-.25,-4.7604,-3,-.25,-5.196,-2.5,-.25,-4.33,-3.044,-.25,-3.967],
// 4 0 -1.9135 -.25 -4.6195 -2.5 -.25 -4.33 -3 -.25 -5.196 -2.2962 -.25 -5.5434
  [4,0,-1.9135,-.25,-4.6195,-2.5,-.25,-4.33,-3,-.25,-5.196,-2.2962,-.25,-5.5434],
// 4 0 -2.2962 -.25 -5.5434 -1.5528 -.25 -5.7954 -1.294 -.25 -4.8295 -1.9135 -.25 -4.6195
  [4,0,-2.2962,-.25,-5.5434,-1.5528,-.25,-5.7954,-1.294,-.25,-4.8295,-1.9135,-.25,-4.6195],
// 4 0 -.6525 -.25 -4.957 -1.294 -.25 -4.8295 -1.5528 -.25 -5.7954 -.783 -.25 -5.9484
  [4,0,-.6525,-.25,-4.957,-1.294,-.25,-4.8295,-1.5528,-.25,-5.7954,-.783,-.25,-5.9484],
// 4 0 -.783 -.25 -5.9484 0 -.25 -6 0 -.25 -5 -.6525 -.25 -4.957
  [4,0,-.783,-.25,-5.9484,0,-.25,-6,0,-.25,-5,-.6525,-.25,-4.957],
// 4 0 -5.196 -.25 -3 -4.33 -.25 -2.5 -4.5768 -.25 -2 -5.5434 -.25 -2.2962
  [4,0,-5.196,-.25,-3,-4.33,-.25,-2.5,-4.5768,-.25,-2,-5.5434,-.25,-2.2962],
// 4 0 -5.5434 -.25 -2.2962 -4.5768 -.25 -2 -4.8879 -.25 -1 -5.7954 -.25 -1.5528
  [4,0,-5.5434,-.25,-2.2962,-4.5768,-.25,-2,-4.8879,-.25,-1,-5.7954,-.25,-1.5528],
// 4 0 -4.8879 -.25 -1 -4.957 -.25 -.6525 -5.9484 -.25 -.783 -5.7954 -.25 -1.5528
  [4,0,-4.8879,-.25,-1,-4.957,-.25,-.6525,-5.9484,-.25,-.783,-5.7954,-.25,-1.5528],
// 4 0 4.8879 -.25 -1 -4.8879 -.25 -1 -4.5768 -.25 -2 0 -.25 -2
  [4,0,4.8879,-.25,-1,-4.8879,-.25,-1,-4.5768,-.25,-2,0,-.25,-2],
// 3 0 4.8879 -.25 -1 0 -.25 -2 4.5768 -.25 -2
  [3,0,4.8879,-.25,-1,0,-.25,-2,4.5768,-.25,-2],
// 4 0 -4.5768 -.25 2 -4.8879 -.25 1 4.8879 -.25 1 0 -.25 2
  [4,0,-4.5768,-.25,2,-4.8879,-.25,1,4.8879,-.25,1,0,-.25,2],
// 3 0 0 -.25 2 4.8879 -.25 1 4.5768 -.25 2
  [3,0,0,-.25,2,4.8879,-.25,1,4.5768,-.25,2],
// 
];
module ldraw_lib__6347356k(step=0, col=false, unit=2/5, alt=false, line=0.2, solid=!$preview)
    makepoly(ldraw_lib__6347356k(), step=step, col=col, unit=unit, alt=alt, line=line, solid=solid);
ldraw_lib__6347356k(line=0.2);
